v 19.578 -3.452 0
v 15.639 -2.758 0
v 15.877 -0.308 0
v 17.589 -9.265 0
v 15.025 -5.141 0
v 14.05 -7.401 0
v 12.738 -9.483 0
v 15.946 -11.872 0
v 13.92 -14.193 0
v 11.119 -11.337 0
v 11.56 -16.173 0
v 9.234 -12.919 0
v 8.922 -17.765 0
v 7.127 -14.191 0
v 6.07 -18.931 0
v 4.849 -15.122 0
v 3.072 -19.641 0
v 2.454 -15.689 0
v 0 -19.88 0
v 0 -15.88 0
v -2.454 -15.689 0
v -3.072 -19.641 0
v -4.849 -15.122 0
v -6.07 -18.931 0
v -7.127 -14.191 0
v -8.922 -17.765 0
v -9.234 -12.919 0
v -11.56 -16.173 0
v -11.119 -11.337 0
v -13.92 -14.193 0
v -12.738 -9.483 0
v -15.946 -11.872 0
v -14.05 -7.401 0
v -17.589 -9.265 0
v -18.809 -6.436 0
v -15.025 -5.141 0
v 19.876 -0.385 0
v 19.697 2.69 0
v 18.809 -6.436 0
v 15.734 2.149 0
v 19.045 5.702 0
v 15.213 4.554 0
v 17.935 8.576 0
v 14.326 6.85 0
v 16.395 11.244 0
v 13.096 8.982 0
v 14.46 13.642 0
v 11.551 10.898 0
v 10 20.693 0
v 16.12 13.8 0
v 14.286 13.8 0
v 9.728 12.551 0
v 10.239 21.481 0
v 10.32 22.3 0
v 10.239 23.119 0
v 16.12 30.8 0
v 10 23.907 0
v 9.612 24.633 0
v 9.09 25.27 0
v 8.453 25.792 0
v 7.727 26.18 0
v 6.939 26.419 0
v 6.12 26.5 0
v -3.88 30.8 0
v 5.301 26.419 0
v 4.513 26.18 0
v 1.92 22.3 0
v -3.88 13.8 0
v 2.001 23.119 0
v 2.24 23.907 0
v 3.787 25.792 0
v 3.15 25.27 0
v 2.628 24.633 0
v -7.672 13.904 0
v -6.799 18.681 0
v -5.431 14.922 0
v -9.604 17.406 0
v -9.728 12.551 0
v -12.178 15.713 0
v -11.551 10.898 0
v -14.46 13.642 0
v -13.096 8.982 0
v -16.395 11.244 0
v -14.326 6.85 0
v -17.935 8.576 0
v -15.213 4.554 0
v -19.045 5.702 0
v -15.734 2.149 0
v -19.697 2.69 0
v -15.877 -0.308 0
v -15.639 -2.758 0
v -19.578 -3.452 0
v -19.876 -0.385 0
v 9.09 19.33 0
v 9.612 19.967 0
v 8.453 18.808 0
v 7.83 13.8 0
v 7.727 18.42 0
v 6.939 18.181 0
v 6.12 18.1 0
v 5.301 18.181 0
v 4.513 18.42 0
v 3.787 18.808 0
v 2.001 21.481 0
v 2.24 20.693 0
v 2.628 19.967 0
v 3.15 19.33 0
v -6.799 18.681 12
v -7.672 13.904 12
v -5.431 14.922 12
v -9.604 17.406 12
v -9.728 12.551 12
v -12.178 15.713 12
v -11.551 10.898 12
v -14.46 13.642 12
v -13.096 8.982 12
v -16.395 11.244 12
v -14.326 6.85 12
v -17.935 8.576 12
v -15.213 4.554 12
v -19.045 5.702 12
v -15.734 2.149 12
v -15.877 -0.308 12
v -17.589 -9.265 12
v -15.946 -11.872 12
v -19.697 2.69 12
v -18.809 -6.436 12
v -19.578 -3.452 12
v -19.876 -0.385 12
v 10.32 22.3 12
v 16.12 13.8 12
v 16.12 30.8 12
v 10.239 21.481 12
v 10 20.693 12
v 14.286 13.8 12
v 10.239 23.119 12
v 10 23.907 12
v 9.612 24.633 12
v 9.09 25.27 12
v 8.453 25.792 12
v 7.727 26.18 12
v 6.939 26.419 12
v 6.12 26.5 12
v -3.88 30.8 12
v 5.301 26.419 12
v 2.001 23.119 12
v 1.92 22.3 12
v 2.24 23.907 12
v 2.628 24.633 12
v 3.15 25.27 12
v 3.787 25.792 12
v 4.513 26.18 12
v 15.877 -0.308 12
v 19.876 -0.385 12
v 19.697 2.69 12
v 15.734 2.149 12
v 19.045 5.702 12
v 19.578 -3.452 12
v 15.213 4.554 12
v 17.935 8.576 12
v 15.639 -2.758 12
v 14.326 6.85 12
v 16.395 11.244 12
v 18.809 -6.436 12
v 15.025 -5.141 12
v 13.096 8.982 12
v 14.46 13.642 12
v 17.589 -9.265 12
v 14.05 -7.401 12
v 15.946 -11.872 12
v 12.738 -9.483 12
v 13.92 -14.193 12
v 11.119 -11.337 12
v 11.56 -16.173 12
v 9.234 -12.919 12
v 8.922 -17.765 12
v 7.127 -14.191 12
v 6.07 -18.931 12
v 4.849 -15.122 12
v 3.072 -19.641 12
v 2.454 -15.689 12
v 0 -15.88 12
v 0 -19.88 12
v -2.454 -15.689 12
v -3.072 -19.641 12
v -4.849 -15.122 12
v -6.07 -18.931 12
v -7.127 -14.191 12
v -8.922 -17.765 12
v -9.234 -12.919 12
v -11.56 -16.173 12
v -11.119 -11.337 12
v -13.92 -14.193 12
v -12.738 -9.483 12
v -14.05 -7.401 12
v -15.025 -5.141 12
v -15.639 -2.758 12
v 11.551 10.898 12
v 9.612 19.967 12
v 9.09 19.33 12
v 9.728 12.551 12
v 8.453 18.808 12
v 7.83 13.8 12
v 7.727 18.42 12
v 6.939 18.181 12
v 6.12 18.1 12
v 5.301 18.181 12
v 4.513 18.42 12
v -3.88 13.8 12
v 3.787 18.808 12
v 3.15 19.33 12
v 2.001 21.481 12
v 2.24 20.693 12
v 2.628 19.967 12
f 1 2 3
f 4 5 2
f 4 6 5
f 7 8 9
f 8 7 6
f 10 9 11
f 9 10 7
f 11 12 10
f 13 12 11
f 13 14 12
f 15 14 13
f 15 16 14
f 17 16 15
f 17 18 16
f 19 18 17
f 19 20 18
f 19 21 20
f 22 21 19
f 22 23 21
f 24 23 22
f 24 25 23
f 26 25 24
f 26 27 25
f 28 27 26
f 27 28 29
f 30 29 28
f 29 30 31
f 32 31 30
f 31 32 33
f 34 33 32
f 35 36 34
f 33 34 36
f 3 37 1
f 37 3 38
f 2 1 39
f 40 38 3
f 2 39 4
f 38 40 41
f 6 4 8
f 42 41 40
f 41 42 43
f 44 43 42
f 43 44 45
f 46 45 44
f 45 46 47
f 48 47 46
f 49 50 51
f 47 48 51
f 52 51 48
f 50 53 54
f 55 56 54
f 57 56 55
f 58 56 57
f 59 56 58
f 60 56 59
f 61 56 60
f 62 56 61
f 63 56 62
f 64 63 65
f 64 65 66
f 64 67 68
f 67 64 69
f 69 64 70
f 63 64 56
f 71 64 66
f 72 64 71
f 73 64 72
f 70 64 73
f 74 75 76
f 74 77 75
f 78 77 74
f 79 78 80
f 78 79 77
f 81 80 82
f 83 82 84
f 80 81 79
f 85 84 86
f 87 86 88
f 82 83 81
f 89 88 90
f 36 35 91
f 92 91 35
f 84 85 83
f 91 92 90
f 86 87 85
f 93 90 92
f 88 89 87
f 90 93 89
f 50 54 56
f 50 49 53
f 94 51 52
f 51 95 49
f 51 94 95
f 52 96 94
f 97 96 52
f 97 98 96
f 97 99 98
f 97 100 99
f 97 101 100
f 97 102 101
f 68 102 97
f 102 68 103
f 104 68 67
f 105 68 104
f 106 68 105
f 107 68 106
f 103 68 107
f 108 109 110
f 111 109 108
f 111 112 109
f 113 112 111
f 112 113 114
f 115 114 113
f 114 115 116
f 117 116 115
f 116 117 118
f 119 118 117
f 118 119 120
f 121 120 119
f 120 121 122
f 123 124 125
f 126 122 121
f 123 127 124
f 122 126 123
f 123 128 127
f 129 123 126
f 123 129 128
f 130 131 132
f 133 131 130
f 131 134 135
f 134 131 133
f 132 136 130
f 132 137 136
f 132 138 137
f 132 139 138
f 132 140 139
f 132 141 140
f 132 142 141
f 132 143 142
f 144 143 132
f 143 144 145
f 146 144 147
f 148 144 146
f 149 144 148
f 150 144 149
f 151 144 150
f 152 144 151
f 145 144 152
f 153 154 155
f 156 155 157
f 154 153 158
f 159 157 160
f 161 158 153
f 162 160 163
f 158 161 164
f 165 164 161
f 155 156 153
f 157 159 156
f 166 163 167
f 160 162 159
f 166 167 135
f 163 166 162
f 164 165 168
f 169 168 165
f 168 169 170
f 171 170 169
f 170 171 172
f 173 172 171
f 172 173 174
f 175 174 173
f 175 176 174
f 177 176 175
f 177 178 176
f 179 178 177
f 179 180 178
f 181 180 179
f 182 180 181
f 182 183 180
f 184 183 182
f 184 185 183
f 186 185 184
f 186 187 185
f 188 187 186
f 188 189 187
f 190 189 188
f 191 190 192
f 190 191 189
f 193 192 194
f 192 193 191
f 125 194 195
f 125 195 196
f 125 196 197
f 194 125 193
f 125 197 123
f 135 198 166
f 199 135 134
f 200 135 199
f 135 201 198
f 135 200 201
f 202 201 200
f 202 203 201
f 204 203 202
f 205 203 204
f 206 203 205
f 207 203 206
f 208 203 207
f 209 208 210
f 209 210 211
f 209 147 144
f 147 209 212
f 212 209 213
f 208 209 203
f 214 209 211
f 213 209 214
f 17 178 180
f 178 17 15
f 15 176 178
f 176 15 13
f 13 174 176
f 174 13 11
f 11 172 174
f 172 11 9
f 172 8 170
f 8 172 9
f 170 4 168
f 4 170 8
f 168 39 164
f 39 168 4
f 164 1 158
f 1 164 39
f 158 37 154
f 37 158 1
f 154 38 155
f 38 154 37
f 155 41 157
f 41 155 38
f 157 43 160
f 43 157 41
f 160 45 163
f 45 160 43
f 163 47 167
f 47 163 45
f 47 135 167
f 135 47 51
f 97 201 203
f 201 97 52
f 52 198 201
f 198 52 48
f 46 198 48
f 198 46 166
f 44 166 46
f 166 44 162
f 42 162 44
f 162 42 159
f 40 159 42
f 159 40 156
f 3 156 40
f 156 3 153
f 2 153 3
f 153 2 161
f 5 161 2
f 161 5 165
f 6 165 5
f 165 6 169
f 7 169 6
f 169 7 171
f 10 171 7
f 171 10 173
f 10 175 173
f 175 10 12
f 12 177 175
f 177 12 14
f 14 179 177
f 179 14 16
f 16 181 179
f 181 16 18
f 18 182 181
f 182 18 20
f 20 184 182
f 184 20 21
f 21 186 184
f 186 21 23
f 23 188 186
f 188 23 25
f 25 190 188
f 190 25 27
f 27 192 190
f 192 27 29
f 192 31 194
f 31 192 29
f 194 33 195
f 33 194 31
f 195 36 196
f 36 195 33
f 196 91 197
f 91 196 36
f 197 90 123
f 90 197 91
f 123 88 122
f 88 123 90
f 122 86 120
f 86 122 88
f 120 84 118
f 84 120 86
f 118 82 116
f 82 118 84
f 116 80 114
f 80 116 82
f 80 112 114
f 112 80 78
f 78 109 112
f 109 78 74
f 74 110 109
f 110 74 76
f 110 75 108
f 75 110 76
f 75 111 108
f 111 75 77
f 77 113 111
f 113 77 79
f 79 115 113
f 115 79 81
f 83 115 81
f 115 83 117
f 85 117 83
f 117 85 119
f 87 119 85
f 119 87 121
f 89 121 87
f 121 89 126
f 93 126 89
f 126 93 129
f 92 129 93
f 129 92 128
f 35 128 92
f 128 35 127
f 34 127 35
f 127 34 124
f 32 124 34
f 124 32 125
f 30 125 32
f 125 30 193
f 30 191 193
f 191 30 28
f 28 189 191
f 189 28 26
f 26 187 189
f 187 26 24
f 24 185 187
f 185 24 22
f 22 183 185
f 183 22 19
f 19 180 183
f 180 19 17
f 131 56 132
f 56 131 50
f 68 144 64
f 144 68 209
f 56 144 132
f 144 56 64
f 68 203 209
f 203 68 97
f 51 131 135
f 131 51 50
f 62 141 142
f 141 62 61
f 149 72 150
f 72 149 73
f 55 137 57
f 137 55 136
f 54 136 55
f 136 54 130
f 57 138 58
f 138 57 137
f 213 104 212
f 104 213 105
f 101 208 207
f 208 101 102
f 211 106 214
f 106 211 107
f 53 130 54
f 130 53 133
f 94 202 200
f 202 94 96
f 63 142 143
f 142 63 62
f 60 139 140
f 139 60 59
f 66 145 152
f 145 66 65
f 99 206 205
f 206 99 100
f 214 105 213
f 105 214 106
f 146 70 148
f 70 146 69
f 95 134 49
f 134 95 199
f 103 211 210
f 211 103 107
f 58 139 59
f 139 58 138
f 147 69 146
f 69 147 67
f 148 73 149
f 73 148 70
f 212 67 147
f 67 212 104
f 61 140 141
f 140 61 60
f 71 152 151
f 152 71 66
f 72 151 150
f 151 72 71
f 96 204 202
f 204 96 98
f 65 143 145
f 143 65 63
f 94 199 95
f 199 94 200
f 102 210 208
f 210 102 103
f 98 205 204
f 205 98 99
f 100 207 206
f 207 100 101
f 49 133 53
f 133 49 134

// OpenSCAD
$fn = 32;

// ----------------------------------------------------------------------
// Pipe clamp: 39.76 mm ring, 4 mm wall, 12 mm wide
// ----------------------------------------------------------------------

// --- parameters (mm) ---
outer_r = 19.88;          // clamp outside radius
inner_r = 15.88;          // pipe bore radius
band = 4;                 // band thickness
clamp_w = 12;             // clamp width
opening = 40;             // opening angle between the ends
lug_w = 20;               // lug width
lug_len = 17;             // lug length
bolt_d = 8.4;             // bolt hole

clamp_profile = [[-6.799, 18.681], [-9.604, 17.406], [-12.178, 15.713], [-14.46, 13.642], [-16.395, 11.244], [-17.935, 8.576], [-19.045, 5.702], [-19.697, 2.69], [-19.876, -0.385], [-19.578, -3.452], [-18.809, -6.436], [-17.589, -9.265], [-15.946, -11.872], [-13.92, -14.193], [-11.56, -16.173], [-8.922, -17.765], [-6.07, -18.931], [-3.072, -19.641], [0, -19.88], [3.072, -19.641], [6.07, -18.931], [8.922, -17.765], [11.56, -16.173], [13.92, -14.193], [15.946, -11.872], [17.589, -9.265], [18.809, -6.436], [19.578, -3.452], [19.876, -0.385], [19.697, 2.69], [19.045, 5.702], [17.935, 8.576], [16.395, 11.244], [14.46, 13.642], [12.178, 15.713], [9.604, 17.406], [6.799, 18.681], [5.431, 14.922], [7.672, 13.904], [9.728, 12.551], [11.551, 10.898], [13.096, 8.982], [14.326, 6.85], [15.213, 4.554], [15.734, 2.149], [15.877, -0.308], [15.639, -2.758], [15.025, -5.141], [14.05, -7.401], [12.738, -9.483], [11.119, -11.337], [9.234, -12.919], [7.127, -14.191], [4.849, -15.122], [2.454, -15.689], [0, -15.88], [-2.454, -15.689], [-4.849, -15.122], [-7.127, -14.191], [-9.234, -12.919], [-11.119, -11.337], [-12.738, -9.483], [-14.05, -7.401], [-15.025, -5.141], [-15.639, -2.758], [-15.877, -0.308], [-15.734, 2.149], [-15.213, 4.554], [-14.326, 6.85], [-13.096, 8.982], [-11.551, 10.898], [-9.728, 12.551], [-7.672, 13.904], [-5.431, 14.922]];

difference() {
  union() {
    linear_extrude(height = clamp_w) polygon(clamp_profile);
    /* bolt lug on the other end */
    translate([-3.88, 13.8, 0]) cube([lug_w, 17, clamp_w]);
  }
  translate([6.12, 22.3, -2.5]) cylinder(h = clamp_w + 5, d = bolt_d);
}
